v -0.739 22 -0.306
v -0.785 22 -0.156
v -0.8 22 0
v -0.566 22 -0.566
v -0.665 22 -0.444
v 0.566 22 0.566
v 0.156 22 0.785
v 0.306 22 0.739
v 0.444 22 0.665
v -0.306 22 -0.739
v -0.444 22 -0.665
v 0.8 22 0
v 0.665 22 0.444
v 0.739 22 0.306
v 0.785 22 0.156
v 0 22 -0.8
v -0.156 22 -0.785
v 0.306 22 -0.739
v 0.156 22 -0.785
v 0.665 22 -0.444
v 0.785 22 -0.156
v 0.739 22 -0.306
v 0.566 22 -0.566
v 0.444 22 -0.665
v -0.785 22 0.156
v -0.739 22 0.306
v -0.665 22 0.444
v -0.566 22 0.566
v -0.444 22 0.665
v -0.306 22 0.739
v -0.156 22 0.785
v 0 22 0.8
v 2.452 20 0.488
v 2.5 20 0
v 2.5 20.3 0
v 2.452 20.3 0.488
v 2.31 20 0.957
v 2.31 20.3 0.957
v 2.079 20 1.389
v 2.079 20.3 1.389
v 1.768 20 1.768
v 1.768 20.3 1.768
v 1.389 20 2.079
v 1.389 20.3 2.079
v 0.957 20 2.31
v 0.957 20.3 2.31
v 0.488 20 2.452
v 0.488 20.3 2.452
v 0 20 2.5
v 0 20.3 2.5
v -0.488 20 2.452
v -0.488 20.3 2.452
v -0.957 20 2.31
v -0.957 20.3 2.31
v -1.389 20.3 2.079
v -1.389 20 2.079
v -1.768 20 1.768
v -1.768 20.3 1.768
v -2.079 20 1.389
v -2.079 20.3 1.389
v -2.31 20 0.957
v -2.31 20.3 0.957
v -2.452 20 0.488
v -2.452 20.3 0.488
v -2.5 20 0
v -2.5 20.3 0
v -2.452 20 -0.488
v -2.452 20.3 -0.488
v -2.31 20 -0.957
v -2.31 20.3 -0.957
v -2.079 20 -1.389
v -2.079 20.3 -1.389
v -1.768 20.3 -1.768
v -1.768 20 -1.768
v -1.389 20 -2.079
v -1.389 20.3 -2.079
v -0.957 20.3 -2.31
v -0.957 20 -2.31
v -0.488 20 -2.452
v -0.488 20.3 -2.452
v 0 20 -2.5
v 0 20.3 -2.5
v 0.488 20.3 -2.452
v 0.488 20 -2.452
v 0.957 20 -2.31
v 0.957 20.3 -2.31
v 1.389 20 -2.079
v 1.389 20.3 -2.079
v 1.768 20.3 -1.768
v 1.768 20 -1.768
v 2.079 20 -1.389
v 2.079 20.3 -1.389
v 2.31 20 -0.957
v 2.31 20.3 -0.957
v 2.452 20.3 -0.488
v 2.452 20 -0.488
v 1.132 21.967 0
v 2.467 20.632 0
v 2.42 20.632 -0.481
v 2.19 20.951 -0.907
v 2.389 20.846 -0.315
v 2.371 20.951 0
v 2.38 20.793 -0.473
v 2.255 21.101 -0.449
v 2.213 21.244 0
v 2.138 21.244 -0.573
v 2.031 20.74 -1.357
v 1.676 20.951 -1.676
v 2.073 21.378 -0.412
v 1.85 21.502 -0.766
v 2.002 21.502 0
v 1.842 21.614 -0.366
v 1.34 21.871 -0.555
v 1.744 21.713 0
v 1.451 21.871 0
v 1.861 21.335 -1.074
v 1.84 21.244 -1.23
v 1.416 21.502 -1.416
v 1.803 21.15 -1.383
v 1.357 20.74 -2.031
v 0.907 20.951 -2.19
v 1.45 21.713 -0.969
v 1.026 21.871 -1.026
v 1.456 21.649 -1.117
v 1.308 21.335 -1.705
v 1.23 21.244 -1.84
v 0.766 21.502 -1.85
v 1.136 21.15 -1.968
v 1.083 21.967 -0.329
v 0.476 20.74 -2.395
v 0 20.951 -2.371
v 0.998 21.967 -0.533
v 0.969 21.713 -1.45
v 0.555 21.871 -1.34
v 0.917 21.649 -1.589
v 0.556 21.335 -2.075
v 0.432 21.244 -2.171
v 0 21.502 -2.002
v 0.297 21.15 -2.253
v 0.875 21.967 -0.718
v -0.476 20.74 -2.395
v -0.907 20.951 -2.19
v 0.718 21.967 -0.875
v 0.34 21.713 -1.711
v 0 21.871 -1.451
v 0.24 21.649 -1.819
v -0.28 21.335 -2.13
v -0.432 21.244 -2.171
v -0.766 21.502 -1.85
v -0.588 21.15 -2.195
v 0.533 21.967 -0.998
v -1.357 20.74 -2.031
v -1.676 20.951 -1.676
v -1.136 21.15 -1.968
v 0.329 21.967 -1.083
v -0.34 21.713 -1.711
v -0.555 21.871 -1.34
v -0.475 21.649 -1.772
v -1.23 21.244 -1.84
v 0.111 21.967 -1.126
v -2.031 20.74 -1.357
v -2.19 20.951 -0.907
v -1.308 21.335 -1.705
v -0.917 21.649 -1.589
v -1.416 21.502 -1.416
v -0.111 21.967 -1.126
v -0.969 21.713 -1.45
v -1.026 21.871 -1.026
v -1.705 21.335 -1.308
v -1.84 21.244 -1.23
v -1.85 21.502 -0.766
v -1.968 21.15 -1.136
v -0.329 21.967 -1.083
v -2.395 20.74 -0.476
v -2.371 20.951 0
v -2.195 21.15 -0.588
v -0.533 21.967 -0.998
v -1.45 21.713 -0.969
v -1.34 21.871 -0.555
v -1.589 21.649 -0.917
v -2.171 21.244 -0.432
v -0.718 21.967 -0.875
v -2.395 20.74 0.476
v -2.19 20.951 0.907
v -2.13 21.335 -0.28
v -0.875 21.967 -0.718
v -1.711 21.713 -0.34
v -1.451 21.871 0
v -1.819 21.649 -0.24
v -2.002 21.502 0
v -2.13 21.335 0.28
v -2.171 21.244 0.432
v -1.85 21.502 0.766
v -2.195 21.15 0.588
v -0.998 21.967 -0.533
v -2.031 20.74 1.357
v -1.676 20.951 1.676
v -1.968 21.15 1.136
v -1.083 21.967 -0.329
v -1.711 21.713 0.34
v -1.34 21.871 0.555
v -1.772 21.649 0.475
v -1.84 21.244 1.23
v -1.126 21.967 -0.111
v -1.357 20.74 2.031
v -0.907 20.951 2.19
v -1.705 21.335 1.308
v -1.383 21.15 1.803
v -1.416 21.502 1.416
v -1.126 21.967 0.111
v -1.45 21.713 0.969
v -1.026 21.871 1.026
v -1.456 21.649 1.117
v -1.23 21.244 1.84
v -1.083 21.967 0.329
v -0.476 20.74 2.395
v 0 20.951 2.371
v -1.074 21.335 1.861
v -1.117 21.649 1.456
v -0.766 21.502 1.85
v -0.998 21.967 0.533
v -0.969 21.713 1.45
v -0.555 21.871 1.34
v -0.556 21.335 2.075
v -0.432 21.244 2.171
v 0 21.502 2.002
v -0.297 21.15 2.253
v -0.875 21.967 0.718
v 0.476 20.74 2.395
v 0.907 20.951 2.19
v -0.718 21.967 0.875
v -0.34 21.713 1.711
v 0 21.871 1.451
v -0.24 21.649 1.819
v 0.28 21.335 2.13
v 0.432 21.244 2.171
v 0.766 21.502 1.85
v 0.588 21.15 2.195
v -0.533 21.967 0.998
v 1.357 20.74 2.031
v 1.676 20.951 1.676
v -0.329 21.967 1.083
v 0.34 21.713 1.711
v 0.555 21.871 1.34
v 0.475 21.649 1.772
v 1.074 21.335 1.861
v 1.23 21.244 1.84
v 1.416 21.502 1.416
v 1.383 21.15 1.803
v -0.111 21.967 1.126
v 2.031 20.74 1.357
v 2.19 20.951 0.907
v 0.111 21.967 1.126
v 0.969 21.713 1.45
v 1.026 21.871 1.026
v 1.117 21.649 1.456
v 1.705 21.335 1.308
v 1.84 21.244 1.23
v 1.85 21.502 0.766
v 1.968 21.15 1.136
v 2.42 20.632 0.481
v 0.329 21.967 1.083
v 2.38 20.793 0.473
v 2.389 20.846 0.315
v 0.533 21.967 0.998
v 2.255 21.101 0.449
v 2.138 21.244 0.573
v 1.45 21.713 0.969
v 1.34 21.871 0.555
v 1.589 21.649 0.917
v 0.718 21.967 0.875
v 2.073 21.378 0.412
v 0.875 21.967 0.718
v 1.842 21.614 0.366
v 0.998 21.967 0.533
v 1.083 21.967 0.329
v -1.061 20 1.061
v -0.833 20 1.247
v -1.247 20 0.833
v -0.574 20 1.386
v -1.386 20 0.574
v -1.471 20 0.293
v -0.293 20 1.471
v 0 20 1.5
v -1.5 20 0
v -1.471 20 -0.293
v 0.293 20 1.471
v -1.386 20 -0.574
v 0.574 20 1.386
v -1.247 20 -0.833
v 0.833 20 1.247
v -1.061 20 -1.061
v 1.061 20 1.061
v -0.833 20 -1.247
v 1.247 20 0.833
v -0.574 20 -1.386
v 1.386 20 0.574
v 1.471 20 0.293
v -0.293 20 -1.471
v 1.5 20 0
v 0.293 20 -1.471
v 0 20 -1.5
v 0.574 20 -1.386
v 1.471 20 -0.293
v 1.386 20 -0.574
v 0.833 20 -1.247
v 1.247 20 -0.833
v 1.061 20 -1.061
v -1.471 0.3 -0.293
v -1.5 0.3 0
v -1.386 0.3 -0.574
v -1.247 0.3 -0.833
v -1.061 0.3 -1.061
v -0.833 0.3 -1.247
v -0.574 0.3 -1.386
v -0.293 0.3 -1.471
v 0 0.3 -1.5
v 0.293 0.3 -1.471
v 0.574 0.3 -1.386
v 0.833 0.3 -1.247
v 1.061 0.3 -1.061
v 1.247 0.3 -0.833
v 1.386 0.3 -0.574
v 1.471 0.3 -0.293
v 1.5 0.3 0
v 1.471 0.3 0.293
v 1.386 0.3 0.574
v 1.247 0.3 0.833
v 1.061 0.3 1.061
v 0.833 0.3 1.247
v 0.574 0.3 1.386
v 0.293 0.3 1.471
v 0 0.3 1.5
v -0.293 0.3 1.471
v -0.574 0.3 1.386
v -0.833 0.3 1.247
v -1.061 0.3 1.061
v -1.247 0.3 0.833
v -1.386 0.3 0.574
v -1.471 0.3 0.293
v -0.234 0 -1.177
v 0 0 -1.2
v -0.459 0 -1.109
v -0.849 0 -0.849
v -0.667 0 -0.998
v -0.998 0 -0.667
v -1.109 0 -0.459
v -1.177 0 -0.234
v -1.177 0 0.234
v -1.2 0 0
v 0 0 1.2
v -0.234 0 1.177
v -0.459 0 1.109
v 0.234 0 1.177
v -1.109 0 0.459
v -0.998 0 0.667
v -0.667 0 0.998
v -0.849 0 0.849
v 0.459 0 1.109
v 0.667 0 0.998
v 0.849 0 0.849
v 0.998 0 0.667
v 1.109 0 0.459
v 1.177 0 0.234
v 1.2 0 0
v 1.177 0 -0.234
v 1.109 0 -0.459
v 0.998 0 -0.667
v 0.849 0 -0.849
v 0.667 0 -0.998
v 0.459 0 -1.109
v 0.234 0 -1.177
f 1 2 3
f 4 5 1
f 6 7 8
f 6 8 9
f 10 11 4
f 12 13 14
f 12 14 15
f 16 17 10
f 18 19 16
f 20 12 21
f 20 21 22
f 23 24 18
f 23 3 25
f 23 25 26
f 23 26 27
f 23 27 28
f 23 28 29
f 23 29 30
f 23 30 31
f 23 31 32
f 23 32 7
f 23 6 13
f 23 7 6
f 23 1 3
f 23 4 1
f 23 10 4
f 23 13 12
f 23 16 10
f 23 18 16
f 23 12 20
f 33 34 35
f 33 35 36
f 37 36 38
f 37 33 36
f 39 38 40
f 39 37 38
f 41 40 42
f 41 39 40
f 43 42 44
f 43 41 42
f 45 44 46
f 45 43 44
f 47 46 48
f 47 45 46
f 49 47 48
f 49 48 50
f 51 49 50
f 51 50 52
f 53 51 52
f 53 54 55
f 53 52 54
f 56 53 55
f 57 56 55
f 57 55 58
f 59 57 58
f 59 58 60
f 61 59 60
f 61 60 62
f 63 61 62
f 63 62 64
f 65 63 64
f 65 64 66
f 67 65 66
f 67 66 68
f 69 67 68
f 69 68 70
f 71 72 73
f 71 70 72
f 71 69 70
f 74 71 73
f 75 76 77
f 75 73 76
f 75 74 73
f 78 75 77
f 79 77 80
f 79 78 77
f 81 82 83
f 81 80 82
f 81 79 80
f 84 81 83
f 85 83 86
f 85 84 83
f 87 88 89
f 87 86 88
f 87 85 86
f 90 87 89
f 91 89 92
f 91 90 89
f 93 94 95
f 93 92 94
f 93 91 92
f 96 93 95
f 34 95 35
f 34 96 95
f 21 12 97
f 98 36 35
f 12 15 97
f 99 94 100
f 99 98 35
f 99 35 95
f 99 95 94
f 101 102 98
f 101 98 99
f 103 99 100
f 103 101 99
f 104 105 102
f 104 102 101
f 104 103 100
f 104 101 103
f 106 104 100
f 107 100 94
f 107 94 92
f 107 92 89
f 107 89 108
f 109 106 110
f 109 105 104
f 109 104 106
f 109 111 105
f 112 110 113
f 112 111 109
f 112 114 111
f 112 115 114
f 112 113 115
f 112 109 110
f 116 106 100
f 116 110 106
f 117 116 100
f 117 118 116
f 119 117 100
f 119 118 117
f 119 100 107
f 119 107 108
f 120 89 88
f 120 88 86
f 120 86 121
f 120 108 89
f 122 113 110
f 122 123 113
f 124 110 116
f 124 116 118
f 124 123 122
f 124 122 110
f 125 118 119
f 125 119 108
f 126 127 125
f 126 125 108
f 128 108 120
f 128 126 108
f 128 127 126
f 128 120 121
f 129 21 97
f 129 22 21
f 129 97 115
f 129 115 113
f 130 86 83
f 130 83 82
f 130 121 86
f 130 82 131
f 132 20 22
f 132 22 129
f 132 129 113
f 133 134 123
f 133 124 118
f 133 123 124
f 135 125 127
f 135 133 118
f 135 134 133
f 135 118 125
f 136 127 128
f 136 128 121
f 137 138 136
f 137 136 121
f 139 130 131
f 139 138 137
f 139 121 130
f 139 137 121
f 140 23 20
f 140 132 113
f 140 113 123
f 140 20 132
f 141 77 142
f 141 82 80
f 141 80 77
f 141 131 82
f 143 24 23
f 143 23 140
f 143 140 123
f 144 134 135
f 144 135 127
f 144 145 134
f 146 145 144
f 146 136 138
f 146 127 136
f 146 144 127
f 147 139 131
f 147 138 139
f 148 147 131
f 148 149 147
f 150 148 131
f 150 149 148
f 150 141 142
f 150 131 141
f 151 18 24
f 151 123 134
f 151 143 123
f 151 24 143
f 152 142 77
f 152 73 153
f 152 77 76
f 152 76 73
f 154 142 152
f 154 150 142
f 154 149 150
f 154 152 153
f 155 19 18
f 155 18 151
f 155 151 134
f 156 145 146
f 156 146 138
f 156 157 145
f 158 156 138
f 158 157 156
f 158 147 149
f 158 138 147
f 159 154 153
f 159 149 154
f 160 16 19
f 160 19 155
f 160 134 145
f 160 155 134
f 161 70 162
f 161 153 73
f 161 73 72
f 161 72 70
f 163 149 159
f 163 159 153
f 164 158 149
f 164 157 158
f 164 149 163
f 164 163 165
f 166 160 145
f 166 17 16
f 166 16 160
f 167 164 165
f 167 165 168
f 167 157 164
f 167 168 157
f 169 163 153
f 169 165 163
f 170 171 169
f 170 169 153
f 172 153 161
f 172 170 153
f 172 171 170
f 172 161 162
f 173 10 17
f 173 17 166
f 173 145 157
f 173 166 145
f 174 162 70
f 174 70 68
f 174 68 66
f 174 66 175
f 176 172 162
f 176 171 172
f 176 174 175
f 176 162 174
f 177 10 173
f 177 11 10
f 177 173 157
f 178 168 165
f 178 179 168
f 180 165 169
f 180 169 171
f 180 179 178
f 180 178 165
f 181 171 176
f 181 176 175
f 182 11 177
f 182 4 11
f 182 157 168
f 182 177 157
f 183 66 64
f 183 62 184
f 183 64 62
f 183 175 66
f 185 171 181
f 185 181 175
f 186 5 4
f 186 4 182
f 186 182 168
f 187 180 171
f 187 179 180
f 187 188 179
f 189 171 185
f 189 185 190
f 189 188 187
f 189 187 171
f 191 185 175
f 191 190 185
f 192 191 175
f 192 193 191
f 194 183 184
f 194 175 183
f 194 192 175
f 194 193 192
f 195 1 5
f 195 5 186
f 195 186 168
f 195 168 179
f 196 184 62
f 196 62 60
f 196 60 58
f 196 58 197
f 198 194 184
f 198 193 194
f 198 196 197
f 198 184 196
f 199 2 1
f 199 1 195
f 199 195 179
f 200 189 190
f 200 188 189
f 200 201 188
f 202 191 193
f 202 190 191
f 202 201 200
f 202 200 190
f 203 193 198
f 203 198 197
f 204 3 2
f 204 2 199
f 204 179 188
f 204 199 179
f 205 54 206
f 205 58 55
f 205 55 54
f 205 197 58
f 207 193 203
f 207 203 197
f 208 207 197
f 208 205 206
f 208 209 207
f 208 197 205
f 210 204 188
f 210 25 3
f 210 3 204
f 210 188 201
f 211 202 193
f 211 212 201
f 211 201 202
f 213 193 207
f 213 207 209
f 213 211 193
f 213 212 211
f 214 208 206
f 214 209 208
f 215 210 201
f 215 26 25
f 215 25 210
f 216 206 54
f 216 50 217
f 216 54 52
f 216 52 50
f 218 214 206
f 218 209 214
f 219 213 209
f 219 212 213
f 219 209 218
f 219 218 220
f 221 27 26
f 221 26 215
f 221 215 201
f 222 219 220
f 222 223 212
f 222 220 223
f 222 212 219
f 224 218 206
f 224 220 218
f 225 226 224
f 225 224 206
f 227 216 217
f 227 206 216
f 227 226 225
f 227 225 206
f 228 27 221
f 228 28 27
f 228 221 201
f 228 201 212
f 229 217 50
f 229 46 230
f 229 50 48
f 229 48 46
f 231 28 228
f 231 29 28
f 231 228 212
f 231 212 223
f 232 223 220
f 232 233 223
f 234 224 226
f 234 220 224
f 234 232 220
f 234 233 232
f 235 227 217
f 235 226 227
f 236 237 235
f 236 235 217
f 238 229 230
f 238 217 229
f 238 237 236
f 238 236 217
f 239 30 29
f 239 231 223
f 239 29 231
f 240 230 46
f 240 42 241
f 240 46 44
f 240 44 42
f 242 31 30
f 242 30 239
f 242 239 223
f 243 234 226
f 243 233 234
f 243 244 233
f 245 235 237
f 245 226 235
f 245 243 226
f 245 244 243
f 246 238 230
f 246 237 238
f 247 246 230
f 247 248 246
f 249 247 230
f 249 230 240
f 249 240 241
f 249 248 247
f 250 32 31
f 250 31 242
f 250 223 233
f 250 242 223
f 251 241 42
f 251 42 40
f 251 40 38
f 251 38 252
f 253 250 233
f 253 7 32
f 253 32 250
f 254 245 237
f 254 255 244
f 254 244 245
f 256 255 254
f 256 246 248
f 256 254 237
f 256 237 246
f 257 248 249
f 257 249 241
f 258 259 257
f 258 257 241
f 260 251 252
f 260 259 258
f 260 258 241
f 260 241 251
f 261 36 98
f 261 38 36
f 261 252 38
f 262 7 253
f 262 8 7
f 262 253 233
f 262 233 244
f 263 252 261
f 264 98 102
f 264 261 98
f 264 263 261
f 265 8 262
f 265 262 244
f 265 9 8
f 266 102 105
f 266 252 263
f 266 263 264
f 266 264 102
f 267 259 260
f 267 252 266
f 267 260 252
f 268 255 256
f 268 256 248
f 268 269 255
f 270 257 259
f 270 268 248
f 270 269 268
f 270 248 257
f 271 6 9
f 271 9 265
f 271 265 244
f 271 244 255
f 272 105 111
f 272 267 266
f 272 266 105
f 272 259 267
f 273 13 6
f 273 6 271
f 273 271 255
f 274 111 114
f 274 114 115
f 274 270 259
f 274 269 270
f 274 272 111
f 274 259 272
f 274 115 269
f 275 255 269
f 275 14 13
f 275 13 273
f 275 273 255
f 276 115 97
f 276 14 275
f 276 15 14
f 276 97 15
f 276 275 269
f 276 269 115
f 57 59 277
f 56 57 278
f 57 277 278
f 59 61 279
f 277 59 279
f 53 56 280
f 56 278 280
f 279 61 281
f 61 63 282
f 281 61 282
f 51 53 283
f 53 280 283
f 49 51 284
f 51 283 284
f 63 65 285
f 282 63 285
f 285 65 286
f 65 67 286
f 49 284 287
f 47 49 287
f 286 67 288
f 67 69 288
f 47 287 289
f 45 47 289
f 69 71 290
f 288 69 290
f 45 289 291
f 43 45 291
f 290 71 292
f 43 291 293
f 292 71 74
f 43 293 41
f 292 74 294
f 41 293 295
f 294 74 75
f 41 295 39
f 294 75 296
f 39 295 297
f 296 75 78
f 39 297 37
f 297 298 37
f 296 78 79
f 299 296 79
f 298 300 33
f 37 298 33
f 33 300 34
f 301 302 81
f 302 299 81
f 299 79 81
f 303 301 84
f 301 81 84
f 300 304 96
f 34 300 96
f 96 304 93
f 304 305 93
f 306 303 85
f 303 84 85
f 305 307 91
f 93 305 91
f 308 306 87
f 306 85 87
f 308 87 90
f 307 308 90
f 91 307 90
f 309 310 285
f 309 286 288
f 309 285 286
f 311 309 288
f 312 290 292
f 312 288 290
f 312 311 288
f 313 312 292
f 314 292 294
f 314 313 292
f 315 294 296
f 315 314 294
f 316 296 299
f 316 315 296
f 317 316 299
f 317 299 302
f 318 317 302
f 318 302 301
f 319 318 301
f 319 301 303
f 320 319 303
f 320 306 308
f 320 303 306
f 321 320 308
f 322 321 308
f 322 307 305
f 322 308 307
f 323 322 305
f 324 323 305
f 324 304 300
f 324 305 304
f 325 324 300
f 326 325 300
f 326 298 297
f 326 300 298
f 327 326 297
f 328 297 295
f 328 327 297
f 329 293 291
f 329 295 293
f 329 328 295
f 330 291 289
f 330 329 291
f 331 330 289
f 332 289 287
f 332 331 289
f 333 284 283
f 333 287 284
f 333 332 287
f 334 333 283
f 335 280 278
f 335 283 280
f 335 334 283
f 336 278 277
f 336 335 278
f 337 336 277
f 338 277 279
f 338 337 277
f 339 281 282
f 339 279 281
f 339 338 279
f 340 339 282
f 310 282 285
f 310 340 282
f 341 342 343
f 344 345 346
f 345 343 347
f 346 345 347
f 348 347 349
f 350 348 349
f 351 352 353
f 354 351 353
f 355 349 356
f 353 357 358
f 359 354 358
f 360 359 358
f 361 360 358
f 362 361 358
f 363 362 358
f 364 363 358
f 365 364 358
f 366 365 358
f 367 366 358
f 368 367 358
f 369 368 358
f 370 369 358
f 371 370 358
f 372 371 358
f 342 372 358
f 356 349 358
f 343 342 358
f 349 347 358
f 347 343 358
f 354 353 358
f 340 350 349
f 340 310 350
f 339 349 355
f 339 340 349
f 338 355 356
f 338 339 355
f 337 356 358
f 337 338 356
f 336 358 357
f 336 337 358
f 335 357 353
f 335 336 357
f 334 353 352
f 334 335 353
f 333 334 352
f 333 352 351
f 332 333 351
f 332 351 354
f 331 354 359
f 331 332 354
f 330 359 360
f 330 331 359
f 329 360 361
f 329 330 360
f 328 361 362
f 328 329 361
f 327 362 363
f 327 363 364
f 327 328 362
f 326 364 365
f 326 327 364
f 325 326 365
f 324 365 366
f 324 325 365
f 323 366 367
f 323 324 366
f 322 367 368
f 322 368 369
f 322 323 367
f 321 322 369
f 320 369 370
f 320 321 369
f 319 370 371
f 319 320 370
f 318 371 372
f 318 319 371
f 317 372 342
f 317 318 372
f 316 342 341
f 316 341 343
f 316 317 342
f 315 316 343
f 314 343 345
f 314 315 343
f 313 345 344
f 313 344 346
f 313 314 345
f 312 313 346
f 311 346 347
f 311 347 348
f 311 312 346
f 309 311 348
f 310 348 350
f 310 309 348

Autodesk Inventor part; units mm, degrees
ref_plane "YZ Plane" through (0, 0, 0) normal (1, 0, 0) x (0, 1, 0)
ref_plane "XZ Plane" through (0, 0, 0) normal (0, 1, 0) x (-1, 0, 0)
ref_plane "XY Plane" through (0, 0, 0) normal (0, 0, 1) x (1, 0, 0)
sketch "Sketch1" plane through (0, 0, 0) normal (0, 1, 0) x (-1, 0, 0)
  circle A0 centre (0, 0) radius 1.5
  dimension "d0" = 3
extrude "Extrusion1" add sketch "Sketch1" along normal blind 20
sketch "Sketch2" plane through (0, 20, 0) normal (0, 1, 0) x (1, 0, 0)
  circle A0 centre (0, 0) radius 2.5
  dimension "d3" = 5
extrude "Extrusion2" add sketch "Sketch2" along normal blind 2
fillet "Fillet1" radius 1.7 1 edges at (-2.5, 22, 0)
chamfer "Chamfer1" distance 0.3 angle 45 1 edges at (1.5, 0, 0)
thread "Thread1" size "M3x0.5" class "6g" standard "ANSI Metric M Profile" full length
properties part number "M3x20 Screw Nylon" material "Nylon 6"
